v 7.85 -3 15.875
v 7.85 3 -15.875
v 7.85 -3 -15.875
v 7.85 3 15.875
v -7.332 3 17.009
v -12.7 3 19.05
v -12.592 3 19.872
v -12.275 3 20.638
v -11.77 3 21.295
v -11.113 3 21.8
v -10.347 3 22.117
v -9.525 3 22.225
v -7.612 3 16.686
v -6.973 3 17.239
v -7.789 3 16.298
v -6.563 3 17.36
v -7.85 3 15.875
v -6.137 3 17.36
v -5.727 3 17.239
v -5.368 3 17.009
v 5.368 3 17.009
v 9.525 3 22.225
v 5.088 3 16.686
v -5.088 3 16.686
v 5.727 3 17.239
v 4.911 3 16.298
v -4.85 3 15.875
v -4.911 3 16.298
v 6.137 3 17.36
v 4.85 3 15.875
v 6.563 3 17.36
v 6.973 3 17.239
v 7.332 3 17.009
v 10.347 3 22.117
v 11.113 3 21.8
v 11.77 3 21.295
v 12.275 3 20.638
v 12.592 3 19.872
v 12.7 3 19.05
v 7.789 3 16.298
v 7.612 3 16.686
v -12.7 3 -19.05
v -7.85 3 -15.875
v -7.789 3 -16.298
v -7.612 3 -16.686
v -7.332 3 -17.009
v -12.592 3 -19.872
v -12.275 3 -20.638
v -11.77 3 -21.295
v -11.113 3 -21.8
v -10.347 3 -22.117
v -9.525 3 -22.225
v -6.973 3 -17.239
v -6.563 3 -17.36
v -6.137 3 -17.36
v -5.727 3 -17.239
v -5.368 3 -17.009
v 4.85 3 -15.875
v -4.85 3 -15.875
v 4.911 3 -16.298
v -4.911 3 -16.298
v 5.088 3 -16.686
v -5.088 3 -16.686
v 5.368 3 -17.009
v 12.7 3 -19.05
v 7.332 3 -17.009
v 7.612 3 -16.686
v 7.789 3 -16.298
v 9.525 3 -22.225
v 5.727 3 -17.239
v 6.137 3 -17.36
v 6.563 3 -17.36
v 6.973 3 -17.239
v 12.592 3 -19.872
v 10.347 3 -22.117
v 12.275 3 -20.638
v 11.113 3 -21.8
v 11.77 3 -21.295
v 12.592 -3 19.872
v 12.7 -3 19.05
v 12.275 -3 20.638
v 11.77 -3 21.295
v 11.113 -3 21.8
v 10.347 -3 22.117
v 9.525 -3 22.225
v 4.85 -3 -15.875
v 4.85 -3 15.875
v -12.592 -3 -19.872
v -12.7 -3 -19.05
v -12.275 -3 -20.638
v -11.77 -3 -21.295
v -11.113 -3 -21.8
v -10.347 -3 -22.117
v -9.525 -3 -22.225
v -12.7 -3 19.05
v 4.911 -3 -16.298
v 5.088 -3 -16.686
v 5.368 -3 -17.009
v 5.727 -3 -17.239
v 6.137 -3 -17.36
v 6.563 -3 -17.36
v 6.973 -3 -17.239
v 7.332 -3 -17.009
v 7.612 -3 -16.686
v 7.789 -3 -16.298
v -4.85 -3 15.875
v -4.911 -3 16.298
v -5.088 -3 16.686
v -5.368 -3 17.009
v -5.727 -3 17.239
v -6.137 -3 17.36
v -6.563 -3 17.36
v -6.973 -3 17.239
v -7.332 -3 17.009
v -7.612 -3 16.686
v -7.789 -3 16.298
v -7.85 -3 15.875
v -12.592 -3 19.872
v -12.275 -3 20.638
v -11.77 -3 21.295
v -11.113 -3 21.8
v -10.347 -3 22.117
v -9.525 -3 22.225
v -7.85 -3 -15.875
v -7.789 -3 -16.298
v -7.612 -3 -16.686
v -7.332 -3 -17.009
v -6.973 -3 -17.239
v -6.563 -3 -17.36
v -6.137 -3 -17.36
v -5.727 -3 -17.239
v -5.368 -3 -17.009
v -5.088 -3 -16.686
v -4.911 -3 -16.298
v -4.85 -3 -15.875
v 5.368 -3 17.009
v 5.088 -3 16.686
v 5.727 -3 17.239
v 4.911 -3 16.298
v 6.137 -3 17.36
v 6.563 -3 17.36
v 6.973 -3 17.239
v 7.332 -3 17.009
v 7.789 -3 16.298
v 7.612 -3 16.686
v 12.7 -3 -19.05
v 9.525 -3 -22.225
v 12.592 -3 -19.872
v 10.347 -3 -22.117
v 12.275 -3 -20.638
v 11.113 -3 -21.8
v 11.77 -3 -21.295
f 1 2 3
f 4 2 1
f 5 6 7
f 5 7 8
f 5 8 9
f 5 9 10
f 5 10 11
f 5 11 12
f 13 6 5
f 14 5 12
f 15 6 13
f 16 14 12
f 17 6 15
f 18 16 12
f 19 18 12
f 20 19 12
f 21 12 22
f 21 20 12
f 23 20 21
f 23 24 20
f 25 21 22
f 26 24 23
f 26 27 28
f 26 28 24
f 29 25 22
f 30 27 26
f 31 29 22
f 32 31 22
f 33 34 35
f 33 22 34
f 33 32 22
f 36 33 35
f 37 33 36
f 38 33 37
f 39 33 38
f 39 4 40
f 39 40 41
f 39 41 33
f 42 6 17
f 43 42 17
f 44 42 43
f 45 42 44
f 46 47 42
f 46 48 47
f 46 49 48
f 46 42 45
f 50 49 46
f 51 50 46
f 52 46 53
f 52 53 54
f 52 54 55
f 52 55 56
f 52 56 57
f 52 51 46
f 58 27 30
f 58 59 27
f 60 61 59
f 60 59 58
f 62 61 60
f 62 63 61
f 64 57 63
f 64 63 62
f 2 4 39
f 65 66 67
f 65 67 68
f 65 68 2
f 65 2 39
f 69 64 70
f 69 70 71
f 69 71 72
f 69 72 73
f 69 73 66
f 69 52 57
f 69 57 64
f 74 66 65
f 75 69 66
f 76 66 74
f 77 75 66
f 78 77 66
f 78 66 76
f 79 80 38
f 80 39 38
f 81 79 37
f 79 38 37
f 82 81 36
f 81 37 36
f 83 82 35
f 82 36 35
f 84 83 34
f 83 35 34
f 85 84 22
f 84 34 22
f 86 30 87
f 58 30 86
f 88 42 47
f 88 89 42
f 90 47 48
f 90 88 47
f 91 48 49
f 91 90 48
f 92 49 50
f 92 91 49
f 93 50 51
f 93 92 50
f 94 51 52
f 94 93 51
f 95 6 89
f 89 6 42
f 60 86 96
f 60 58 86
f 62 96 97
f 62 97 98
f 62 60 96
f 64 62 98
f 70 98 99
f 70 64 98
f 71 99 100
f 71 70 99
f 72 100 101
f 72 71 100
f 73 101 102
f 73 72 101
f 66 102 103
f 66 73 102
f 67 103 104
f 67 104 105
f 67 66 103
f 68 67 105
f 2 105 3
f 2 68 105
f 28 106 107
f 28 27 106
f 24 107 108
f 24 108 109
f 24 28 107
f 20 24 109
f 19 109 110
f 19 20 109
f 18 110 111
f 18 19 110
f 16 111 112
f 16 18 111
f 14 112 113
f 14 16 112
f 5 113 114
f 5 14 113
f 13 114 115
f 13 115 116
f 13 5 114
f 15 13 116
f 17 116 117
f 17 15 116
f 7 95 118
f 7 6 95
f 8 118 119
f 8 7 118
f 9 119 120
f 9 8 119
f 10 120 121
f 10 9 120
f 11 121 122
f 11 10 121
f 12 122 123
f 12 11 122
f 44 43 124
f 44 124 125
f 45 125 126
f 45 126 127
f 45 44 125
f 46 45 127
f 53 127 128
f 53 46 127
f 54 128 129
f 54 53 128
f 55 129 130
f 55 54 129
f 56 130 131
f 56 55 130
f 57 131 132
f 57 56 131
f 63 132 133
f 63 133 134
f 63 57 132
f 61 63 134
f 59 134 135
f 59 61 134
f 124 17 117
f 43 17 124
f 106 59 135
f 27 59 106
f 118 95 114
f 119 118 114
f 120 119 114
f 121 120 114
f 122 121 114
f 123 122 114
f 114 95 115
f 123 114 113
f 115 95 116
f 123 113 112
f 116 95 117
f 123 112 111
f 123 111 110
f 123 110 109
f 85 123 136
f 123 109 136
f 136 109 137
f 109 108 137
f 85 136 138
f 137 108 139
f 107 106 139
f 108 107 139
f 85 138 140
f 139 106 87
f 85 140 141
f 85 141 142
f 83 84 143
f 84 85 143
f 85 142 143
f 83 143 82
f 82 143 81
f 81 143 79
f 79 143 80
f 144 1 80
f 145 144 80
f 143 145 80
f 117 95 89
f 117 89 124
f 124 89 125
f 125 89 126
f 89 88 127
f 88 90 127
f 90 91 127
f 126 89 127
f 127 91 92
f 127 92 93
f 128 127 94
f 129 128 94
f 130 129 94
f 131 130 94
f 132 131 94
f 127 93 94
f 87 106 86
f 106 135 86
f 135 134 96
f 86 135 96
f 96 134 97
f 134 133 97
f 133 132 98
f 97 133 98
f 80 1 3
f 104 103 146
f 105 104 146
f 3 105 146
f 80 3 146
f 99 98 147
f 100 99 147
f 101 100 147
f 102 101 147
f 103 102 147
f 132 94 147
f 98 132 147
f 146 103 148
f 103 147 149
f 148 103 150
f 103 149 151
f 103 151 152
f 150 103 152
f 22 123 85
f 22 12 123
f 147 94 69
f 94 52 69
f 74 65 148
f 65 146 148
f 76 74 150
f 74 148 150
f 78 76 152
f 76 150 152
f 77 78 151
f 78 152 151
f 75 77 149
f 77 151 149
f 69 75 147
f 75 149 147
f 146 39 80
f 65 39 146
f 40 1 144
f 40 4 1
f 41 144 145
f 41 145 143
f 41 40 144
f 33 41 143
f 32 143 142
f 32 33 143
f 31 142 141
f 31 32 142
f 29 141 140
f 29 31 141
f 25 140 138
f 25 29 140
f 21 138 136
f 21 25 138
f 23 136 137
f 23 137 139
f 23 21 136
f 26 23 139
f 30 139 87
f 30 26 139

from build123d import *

# Parameters (mm, degrees)
SKETCH1_W           = 25.4
SKETCH1_H           = 44.45
BOSS_EXTRUDE1_DEPTH = 3
FILLET1_R           = 3.175


with BuildPart() as part:
    # Sketch1 → Boss-Extrude1 (new, symmetric)
    with BuildSketch(Plane(origin=(0, 0, 0), x_dir=(1, 0, 0), z_dir=(0, 1, 0))):
        Rectangle(SKETCH1_W, SKETCH1_H)
        with BuildLine():
            Line((-7.85, -15.875), (-7.85, 15.875))
            ThreePointArc((-7.85, 15.875), (-6.35, 17.375), (-4.85, 15.875))
            Line((-4.85, 15.875), (-4.85, -15.875))
            ThreePointArc((-4.85, -15.875), (-6.35, -17.375), (-7.85, -15.875))
        make_face(mode=Mode.SUBTRACT)
        with BuildLine():
            Line((4.85, -15.875), (4.85, 15.875))
            ThreePointArc((4.85, 15.875), (6.35, 17.375), (7.85, 15.875))
            Line((7.85, 15.875), (7.85, -15.875))
            ThreePointArc((7.85, -15.875), (6.35, -17.375), (4.85, -15.875))
        make_face(mode=Mode.SUBTRACT)
    extrude(amount=BOSS_EXTRUDE1_DEPTH, both=True)

    # Fillet1
    fillet1_edges = [part.edges().sort_by_distance(p)[0] for p in [
        (-12.7, 0, -22.225),
        (12.7, 0, -22.225),
        (12.7, 0, 22.225),
        (-12.7, 0, 22.225),
    ]]
    fillet(fillet1_edges, radius=FILLET1_R)


solid = part.part
